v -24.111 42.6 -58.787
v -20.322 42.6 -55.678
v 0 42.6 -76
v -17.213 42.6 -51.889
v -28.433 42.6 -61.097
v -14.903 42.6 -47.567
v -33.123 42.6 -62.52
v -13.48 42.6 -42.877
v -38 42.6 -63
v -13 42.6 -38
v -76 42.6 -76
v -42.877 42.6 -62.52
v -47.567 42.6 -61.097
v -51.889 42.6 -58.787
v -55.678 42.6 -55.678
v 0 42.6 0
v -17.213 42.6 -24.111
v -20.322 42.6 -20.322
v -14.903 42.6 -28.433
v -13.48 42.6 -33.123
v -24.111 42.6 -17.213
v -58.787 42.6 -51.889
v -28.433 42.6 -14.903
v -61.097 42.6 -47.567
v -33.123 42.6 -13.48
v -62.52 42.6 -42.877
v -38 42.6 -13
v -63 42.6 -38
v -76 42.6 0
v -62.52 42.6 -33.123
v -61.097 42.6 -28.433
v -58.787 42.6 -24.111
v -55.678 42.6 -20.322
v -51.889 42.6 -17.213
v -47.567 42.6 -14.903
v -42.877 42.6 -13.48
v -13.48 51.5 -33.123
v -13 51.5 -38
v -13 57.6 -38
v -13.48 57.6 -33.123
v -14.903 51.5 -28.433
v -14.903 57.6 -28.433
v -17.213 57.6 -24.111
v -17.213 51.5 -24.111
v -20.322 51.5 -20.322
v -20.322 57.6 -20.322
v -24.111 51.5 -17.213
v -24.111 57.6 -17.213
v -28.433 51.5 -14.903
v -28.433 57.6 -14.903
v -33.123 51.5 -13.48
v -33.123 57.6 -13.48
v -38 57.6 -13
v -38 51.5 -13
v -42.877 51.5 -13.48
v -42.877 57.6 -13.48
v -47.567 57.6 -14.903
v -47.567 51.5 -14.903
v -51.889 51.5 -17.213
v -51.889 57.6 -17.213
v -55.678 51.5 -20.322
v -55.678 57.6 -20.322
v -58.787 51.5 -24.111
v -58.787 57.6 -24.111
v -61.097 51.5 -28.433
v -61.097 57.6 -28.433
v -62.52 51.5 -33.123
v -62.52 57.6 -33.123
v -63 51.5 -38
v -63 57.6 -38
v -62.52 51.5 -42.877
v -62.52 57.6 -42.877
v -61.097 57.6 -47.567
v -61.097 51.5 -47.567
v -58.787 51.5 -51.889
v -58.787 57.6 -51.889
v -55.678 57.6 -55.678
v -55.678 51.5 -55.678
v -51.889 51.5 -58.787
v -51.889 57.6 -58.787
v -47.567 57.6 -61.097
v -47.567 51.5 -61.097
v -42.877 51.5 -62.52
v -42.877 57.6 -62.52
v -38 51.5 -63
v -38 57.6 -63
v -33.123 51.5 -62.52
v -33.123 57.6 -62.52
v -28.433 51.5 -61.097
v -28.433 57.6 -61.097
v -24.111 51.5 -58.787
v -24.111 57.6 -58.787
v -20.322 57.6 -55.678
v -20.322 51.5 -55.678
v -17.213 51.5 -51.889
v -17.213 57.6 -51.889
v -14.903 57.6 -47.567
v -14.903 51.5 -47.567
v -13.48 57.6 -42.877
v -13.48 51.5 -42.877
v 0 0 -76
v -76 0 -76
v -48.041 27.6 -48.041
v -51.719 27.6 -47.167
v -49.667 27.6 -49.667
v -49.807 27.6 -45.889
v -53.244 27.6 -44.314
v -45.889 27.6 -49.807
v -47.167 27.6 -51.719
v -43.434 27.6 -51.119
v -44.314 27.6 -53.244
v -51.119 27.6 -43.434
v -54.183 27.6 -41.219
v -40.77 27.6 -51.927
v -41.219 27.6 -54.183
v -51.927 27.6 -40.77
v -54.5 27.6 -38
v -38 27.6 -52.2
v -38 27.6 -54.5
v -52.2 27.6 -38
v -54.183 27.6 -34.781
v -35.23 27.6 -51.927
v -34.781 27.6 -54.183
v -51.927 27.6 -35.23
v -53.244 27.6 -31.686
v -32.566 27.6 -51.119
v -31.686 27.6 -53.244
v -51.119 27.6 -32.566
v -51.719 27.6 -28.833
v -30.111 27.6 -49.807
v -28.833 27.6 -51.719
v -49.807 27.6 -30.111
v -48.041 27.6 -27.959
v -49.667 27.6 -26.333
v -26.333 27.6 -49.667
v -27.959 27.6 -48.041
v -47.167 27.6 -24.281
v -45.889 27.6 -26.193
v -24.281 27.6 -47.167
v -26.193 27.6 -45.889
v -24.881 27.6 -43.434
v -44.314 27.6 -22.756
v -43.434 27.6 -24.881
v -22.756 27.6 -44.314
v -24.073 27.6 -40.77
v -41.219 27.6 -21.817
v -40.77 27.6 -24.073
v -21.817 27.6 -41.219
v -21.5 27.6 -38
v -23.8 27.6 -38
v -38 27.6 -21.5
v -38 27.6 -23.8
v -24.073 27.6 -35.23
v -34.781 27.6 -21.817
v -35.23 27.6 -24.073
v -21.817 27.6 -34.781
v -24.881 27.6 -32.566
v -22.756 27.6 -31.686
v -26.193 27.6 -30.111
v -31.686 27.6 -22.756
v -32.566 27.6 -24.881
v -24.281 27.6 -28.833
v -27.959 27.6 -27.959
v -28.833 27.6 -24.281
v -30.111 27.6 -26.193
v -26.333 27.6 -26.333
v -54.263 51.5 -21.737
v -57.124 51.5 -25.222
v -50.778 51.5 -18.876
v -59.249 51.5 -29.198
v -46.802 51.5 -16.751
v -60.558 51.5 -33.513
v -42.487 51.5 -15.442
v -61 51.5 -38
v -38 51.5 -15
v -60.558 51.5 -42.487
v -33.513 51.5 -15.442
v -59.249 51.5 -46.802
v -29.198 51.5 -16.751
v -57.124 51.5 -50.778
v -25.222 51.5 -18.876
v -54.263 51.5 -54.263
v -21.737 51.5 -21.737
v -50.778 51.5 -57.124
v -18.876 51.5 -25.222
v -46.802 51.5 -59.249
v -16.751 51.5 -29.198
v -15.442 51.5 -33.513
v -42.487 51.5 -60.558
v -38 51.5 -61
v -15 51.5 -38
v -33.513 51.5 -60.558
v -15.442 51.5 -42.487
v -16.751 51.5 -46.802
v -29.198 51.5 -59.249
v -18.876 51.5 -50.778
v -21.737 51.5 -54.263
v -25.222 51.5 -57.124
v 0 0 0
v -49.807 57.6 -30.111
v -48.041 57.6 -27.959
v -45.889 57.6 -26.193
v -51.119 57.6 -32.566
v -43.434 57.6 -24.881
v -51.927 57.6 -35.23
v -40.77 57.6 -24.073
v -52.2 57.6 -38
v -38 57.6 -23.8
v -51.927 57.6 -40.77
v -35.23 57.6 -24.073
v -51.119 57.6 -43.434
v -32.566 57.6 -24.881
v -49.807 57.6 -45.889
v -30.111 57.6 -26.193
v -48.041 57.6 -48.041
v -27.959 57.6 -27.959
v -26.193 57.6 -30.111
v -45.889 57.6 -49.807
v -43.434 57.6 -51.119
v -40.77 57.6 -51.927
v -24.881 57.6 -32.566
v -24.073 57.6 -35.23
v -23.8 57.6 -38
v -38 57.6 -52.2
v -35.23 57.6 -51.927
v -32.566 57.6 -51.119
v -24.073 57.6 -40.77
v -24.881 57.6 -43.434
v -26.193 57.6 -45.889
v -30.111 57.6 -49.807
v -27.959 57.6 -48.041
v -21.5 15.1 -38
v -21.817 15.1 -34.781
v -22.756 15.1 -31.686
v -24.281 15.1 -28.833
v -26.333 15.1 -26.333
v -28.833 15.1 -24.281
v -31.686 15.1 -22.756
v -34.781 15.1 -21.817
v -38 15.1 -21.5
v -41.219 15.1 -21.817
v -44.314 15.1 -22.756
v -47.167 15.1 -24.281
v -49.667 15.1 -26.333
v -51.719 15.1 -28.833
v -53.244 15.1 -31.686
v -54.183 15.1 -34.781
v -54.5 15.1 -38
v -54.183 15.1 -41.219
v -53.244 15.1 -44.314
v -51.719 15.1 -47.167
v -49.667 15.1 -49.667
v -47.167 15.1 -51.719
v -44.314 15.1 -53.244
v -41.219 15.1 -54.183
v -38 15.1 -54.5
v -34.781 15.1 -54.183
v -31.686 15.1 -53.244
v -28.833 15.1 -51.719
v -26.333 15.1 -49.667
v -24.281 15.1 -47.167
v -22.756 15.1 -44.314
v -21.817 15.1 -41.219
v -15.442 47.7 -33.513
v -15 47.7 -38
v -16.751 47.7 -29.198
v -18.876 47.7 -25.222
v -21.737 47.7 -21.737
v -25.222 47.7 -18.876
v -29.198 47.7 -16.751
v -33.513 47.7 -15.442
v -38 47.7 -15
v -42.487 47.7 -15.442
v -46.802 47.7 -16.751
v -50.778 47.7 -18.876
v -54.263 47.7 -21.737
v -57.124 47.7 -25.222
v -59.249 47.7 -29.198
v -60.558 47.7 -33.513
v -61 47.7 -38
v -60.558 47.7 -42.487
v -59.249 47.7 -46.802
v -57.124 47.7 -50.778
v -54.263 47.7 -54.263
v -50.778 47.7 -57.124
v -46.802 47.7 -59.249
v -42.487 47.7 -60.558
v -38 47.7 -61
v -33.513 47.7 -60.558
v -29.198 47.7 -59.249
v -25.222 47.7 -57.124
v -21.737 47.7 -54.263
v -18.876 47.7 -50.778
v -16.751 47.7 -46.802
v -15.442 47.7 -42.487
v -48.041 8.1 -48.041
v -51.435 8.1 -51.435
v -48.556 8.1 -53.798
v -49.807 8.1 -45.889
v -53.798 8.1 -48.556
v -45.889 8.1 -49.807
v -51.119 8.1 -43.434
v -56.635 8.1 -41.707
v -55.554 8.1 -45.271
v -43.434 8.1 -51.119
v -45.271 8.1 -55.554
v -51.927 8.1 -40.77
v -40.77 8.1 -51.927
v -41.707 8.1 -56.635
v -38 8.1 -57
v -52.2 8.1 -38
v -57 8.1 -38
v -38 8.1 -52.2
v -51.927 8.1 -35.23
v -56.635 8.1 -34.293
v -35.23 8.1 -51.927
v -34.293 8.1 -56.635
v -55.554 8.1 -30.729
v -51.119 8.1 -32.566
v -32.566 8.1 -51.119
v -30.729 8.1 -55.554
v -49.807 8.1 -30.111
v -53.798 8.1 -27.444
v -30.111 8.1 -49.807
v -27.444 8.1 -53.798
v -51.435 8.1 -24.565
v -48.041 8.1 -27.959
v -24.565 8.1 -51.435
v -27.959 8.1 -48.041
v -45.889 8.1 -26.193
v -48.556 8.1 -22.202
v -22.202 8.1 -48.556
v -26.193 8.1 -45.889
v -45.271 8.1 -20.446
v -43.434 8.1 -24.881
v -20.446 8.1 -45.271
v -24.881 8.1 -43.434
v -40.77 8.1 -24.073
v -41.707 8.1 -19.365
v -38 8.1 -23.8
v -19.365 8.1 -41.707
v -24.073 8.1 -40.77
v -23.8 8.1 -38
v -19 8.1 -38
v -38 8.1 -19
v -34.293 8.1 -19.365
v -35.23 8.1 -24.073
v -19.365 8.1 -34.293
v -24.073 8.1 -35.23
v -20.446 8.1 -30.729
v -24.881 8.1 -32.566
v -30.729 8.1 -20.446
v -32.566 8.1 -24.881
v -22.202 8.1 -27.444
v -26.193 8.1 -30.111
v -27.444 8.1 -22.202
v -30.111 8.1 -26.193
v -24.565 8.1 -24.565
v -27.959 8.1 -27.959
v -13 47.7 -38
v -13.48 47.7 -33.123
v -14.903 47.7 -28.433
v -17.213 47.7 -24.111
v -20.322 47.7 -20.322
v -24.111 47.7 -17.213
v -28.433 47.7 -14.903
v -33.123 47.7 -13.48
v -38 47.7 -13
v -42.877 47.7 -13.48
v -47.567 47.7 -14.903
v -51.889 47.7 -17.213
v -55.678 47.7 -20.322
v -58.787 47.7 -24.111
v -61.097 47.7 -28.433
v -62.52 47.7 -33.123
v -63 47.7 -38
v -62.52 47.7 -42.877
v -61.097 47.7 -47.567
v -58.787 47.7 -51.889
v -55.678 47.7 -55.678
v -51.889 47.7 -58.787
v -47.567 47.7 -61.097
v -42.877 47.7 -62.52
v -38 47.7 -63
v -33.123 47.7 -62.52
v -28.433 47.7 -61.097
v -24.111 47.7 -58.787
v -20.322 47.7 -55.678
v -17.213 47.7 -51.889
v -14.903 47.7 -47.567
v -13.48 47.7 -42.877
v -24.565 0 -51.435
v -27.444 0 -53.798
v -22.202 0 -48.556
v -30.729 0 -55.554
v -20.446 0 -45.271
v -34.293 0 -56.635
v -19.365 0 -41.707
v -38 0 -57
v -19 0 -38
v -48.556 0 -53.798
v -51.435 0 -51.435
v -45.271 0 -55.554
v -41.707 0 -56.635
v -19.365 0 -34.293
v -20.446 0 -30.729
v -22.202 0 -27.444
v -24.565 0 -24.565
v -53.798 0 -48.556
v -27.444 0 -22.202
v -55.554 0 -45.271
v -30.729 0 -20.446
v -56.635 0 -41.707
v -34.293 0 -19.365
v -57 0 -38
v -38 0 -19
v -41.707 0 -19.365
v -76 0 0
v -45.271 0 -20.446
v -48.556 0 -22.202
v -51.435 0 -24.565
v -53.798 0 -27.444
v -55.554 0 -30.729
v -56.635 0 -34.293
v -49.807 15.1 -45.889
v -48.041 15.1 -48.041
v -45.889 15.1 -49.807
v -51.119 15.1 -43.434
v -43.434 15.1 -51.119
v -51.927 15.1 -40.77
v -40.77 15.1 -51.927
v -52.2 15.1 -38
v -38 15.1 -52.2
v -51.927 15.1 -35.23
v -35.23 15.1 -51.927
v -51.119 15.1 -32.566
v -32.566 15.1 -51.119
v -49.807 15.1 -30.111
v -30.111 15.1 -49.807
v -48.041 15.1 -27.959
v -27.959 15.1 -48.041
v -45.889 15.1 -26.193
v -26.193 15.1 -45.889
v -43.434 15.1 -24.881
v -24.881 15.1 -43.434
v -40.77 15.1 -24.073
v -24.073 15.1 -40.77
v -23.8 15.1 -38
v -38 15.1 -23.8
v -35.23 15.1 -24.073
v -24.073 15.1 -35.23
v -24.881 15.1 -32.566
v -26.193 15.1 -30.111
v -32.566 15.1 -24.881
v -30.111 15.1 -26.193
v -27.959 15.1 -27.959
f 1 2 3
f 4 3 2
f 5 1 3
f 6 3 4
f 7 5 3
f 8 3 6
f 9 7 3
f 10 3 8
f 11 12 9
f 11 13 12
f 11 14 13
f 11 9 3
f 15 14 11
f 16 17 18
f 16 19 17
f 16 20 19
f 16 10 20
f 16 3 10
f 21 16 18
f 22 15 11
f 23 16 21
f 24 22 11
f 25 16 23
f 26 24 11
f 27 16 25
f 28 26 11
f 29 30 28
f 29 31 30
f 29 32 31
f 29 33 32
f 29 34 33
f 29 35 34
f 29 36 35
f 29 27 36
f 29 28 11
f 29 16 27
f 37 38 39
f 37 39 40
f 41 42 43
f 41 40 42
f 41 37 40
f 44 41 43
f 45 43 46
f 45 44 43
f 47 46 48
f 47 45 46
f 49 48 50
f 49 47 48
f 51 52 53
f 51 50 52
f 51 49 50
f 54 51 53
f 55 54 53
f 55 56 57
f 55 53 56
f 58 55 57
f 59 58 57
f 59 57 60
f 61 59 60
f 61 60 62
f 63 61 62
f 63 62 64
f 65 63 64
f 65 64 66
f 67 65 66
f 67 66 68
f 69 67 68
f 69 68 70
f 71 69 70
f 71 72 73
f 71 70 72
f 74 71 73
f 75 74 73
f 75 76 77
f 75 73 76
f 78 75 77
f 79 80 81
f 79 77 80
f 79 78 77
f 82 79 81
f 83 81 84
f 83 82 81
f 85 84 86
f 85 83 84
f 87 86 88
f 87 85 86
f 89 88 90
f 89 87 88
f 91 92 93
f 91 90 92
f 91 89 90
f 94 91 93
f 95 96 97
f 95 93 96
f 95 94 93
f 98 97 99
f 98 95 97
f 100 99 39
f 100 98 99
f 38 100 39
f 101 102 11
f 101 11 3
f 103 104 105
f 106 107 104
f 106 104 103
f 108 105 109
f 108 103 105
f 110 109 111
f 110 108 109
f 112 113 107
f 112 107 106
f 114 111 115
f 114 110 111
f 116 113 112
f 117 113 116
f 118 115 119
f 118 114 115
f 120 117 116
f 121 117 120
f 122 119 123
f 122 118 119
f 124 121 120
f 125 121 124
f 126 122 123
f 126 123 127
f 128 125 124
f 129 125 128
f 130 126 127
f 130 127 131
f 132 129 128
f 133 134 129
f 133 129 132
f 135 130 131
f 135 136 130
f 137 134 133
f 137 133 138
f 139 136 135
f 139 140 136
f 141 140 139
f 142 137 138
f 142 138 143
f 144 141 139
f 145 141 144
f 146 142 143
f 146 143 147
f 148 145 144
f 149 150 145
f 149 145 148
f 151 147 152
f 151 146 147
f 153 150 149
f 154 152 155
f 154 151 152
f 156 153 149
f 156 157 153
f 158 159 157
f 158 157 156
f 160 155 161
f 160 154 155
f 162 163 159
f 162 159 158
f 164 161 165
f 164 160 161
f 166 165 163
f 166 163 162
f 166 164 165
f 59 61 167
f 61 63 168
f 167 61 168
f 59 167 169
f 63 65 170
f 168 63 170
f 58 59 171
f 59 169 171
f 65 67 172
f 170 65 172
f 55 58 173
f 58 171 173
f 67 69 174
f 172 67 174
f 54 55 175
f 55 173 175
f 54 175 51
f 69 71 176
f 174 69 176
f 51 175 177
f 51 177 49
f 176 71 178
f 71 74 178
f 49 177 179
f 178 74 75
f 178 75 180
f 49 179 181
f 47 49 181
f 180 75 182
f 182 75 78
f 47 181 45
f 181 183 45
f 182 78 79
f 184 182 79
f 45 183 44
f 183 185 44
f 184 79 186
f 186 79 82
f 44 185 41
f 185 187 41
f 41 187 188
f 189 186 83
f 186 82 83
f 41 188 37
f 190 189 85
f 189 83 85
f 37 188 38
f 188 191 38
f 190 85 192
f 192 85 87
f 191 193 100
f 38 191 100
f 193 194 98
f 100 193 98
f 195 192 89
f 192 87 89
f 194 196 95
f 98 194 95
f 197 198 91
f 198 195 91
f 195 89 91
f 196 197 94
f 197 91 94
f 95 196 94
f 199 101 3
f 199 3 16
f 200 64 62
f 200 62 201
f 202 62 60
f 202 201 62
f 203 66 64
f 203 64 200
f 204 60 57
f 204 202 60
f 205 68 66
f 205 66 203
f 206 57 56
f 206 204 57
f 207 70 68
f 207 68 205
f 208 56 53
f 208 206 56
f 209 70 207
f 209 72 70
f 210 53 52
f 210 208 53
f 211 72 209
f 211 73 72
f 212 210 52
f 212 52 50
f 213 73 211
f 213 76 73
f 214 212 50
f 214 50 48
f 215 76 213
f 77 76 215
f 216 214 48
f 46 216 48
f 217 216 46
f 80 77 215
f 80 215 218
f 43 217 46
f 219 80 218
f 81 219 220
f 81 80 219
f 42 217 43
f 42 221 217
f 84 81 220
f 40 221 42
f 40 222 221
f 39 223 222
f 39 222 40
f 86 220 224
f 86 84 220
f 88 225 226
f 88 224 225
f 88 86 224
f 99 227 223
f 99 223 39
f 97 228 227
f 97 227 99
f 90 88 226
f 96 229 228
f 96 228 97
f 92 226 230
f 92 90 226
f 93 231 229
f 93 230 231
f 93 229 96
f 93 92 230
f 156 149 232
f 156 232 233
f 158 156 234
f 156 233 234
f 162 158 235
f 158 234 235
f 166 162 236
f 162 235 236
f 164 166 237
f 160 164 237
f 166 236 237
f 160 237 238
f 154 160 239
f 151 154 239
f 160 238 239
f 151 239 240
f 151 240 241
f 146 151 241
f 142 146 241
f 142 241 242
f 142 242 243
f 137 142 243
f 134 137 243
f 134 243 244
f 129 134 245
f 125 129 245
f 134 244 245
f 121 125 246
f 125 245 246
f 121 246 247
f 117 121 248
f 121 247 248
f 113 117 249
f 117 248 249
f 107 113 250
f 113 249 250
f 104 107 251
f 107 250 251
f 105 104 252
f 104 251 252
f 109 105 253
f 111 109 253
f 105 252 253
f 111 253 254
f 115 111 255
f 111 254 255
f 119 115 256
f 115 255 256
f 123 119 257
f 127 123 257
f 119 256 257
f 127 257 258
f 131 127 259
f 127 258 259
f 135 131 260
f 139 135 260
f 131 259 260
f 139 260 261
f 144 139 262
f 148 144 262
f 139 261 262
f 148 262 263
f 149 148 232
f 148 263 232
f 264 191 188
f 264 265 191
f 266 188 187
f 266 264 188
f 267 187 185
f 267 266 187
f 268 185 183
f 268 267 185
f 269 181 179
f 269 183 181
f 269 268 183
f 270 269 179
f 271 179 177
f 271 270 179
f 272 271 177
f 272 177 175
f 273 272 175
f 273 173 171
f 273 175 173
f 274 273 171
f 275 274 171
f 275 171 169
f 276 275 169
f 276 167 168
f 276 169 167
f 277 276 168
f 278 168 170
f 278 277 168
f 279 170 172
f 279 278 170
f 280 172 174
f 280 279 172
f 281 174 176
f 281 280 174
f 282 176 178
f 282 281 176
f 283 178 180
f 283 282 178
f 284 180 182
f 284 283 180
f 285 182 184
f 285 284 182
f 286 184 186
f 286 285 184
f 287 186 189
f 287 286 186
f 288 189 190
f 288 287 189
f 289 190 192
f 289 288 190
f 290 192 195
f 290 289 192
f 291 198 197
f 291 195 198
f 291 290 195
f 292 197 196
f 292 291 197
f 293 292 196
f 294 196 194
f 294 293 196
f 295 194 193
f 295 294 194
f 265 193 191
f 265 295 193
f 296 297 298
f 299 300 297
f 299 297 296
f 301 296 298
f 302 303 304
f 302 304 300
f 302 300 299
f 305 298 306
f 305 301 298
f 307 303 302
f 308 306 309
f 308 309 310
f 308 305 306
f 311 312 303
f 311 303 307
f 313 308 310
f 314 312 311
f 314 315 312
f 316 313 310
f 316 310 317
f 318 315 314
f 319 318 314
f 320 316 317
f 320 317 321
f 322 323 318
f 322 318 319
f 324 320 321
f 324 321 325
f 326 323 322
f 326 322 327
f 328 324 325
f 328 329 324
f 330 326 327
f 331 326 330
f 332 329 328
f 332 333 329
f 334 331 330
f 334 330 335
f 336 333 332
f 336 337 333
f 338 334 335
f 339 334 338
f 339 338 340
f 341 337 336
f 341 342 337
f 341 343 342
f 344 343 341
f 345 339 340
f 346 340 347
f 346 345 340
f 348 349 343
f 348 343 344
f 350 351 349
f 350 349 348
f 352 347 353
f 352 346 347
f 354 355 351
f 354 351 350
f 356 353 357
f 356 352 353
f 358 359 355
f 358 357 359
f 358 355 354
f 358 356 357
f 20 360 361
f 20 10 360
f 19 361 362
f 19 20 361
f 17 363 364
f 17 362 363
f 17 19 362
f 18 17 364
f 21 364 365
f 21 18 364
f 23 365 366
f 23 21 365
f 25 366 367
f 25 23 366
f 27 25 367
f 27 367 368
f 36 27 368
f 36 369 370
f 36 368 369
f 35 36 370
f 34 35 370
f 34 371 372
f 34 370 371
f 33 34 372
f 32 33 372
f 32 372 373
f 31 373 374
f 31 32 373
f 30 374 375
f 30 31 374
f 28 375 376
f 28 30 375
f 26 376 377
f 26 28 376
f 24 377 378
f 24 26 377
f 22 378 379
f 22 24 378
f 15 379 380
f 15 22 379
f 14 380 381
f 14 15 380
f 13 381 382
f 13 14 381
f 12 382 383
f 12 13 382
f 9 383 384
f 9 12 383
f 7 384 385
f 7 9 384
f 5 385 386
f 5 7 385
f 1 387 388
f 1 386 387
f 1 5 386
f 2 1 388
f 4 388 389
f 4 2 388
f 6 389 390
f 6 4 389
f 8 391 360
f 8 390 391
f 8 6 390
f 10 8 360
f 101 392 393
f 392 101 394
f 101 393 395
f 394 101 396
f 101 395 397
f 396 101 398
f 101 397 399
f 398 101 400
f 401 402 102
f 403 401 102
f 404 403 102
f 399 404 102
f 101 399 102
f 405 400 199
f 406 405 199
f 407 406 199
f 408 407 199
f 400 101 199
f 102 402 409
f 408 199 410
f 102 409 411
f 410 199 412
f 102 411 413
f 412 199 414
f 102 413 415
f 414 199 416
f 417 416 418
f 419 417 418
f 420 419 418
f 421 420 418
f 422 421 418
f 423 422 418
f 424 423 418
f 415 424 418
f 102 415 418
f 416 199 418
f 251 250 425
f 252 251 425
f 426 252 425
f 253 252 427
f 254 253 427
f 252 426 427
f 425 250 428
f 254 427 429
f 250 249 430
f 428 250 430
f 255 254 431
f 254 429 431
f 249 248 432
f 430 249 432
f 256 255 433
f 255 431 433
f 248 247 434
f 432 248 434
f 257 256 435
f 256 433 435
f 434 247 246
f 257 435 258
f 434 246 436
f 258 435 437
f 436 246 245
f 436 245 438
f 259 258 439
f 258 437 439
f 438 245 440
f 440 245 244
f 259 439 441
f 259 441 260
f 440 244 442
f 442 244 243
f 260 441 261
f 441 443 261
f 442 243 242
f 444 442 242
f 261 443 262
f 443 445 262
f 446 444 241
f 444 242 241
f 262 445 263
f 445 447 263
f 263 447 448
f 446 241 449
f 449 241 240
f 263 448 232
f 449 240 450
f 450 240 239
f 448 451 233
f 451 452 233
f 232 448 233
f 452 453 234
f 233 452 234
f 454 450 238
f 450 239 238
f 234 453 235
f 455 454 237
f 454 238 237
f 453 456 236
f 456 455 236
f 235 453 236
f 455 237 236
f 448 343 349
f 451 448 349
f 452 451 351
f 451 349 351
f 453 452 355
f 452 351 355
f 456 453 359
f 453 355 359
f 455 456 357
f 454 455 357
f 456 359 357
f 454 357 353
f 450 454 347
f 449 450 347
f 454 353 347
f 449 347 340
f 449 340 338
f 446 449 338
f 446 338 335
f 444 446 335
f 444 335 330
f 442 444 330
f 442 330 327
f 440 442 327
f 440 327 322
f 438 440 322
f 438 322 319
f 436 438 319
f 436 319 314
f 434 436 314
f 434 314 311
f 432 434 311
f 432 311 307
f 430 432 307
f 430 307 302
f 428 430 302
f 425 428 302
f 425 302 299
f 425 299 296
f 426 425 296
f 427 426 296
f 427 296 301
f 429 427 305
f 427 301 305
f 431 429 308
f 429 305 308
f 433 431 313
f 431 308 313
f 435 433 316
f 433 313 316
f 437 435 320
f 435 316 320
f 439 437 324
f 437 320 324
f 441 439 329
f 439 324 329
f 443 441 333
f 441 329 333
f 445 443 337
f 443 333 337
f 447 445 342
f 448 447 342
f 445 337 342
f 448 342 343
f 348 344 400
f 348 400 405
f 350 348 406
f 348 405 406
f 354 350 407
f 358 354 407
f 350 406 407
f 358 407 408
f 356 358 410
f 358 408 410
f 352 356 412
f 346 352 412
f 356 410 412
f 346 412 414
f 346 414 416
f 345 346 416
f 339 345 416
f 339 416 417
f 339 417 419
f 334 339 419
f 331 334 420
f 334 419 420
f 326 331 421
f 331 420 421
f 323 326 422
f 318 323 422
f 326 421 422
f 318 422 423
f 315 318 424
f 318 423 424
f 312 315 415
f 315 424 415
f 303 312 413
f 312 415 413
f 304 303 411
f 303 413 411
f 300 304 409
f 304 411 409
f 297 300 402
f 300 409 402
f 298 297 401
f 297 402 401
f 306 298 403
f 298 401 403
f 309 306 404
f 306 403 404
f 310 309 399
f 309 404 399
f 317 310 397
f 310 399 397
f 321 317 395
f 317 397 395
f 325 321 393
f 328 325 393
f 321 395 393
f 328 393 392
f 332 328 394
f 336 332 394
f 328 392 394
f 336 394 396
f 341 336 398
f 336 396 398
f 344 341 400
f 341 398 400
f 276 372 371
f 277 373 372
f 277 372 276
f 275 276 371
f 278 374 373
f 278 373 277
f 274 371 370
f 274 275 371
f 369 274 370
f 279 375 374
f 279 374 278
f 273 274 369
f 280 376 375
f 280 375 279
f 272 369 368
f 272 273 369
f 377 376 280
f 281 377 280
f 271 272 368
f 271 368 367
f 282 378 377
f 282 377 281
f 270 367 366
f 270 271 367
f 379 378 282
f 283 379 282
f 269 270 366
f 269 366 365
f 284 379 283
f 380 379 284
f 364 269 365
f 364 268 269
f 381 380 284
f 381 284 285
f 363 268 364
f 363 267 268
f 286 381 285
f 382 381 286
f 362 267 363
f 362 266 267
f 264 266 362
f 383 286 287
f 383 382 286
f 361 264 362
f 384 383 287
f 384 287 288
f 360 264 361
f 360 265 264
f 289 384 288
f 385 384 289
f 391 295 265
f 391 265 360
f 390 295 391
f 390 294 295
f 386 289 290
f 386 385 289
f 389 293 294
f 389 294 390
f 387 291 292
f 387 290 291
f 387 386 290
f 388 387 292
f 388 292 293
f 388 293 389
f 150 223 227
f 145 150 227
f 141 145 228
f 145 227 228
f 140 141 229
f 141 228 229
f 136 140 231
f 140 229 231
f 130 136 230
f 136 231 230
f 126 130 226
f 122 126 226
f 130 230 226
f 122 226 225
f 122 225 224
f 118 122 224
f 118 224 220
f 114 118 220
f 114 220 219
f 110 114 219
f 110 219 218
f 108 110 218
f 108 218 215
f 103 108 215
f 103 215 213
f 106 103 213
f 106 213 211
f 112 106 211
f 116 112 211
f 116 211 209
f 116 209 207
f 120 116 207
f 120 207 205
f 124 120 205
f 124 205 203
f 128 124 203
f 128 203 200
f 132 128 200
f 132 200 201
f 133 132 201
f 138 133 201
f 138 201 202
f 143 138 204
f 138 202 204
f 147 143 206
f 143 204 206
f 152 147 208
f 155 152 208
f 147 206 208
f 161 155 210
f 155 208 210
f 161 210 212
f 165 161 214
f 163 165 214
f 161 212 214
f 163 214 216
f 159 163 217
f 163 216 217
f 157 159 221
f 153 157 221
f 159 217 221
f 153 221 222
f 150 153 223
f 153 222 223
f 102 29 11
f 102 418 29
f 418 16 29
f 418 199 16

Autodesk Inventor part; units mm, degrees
ref_plane "YZ Plane" through (0, 0, 0) normal (1, 0, 0) x (0, 1, 0)
ref_plane "XZ Plane" through (0, 0, 0) normal (0, 1, 0) x (-1, 0, 0)
ref_plane "XY Plane" through (0, 0, 0) normal (0, 0, 1) x (1, 0, 0)
sketch "Sketch1" plane through (0, 0, 0) normal (0, 1, 0) x (-1, 0, 0)
  point P0 (0, 0)
sketch "Sketch2" plane through (0, 0, 0) normal (0, 1, 0) x (-1, 0, 0)
  line L0 (0, 0) -> (76, 0)
  line L1 (76, 0) -> (76, -76)
  line L2 (76, -76) -> (0, -76)
  line L3 (0, -76) -> (0, 0)
  dimension "d3" = 76
  dimension "d4" = 76
extrude "Extrusion1" add sketch "Sketch2" along normal blind 42.6
sketch "Sketch3" plane through (0, 42.6, 0) normal (0, 1, 0) x (1, 0, 0)
  circle A0 centre (-38, 38) radius 25
  point P0 (0, 0)
  dimension "d7" = 50
extrude "Extrusion2" add sketch "Sketch3" along normal blind 5.1
sketch "Sketch4" plane through (-38, 47.7, -38) normal (0, 1, 0) x (1, 0, 0)
  circle A0 centre (0, 0) radius 23
  point P0 (38, -38)
  dimension "d10" = 46
extrude "Extrusion3" add sketch "Sketch4" along normal blind 3.8
sketch "Sketch5" plane through (-38, 51.5, -38) normal (0, 1, 0) x (1, 0, 0)
  circle A0 centre (0, 0) radius 25
  point P0 (38, -38)
extrude "Extrusion4" add sketch "Sketch5" along normal blind 6.1
sketch "Sketch6" plane through (0, 0, 0) normal (0, -1, 0) x (1, 0, 0)
  circle A0 centre (-38, -38) radius 19
  point P0 (0, 0)
  dimension "d15" = 38
extrude "Extrusion5" cut sketch "Sketch6" against normal blind 8.1
sketch "Sketch7" plane through (-38, 8.1, -38) normal (0, -1, 0) x (1, 0, 0)
  circle A0 centre (0, 0) radius 14.2
  point P0 (38, 38)
  dimension "d18" = 28.4
extrude "Extrusion6" cut sketch "Sketch7" against normal blind 7
sketch "Sketch8" plane through (-38, 15.1, -38) normal (0, -1, 0) x (1, 0, 0)
  circle A0 centre (0, 0) radius 16.5
  point P0 (38, 38)
  dimension "d21" = 33
extrude "Extrusion7" cut sketch "Sketch8" against normal blind 12.5
sketch "Sketch9" plane through (-38, 57.6, -38) normal (0, 1, 0) x (1, 0, 0)
  circle A0 centre (0, 0) radius 14.2
  point P0 (38, -38)
  dimension "d24" = 28.4
extrude "Extrusion8" cut sketch "Sketch9" against normal blind 30
